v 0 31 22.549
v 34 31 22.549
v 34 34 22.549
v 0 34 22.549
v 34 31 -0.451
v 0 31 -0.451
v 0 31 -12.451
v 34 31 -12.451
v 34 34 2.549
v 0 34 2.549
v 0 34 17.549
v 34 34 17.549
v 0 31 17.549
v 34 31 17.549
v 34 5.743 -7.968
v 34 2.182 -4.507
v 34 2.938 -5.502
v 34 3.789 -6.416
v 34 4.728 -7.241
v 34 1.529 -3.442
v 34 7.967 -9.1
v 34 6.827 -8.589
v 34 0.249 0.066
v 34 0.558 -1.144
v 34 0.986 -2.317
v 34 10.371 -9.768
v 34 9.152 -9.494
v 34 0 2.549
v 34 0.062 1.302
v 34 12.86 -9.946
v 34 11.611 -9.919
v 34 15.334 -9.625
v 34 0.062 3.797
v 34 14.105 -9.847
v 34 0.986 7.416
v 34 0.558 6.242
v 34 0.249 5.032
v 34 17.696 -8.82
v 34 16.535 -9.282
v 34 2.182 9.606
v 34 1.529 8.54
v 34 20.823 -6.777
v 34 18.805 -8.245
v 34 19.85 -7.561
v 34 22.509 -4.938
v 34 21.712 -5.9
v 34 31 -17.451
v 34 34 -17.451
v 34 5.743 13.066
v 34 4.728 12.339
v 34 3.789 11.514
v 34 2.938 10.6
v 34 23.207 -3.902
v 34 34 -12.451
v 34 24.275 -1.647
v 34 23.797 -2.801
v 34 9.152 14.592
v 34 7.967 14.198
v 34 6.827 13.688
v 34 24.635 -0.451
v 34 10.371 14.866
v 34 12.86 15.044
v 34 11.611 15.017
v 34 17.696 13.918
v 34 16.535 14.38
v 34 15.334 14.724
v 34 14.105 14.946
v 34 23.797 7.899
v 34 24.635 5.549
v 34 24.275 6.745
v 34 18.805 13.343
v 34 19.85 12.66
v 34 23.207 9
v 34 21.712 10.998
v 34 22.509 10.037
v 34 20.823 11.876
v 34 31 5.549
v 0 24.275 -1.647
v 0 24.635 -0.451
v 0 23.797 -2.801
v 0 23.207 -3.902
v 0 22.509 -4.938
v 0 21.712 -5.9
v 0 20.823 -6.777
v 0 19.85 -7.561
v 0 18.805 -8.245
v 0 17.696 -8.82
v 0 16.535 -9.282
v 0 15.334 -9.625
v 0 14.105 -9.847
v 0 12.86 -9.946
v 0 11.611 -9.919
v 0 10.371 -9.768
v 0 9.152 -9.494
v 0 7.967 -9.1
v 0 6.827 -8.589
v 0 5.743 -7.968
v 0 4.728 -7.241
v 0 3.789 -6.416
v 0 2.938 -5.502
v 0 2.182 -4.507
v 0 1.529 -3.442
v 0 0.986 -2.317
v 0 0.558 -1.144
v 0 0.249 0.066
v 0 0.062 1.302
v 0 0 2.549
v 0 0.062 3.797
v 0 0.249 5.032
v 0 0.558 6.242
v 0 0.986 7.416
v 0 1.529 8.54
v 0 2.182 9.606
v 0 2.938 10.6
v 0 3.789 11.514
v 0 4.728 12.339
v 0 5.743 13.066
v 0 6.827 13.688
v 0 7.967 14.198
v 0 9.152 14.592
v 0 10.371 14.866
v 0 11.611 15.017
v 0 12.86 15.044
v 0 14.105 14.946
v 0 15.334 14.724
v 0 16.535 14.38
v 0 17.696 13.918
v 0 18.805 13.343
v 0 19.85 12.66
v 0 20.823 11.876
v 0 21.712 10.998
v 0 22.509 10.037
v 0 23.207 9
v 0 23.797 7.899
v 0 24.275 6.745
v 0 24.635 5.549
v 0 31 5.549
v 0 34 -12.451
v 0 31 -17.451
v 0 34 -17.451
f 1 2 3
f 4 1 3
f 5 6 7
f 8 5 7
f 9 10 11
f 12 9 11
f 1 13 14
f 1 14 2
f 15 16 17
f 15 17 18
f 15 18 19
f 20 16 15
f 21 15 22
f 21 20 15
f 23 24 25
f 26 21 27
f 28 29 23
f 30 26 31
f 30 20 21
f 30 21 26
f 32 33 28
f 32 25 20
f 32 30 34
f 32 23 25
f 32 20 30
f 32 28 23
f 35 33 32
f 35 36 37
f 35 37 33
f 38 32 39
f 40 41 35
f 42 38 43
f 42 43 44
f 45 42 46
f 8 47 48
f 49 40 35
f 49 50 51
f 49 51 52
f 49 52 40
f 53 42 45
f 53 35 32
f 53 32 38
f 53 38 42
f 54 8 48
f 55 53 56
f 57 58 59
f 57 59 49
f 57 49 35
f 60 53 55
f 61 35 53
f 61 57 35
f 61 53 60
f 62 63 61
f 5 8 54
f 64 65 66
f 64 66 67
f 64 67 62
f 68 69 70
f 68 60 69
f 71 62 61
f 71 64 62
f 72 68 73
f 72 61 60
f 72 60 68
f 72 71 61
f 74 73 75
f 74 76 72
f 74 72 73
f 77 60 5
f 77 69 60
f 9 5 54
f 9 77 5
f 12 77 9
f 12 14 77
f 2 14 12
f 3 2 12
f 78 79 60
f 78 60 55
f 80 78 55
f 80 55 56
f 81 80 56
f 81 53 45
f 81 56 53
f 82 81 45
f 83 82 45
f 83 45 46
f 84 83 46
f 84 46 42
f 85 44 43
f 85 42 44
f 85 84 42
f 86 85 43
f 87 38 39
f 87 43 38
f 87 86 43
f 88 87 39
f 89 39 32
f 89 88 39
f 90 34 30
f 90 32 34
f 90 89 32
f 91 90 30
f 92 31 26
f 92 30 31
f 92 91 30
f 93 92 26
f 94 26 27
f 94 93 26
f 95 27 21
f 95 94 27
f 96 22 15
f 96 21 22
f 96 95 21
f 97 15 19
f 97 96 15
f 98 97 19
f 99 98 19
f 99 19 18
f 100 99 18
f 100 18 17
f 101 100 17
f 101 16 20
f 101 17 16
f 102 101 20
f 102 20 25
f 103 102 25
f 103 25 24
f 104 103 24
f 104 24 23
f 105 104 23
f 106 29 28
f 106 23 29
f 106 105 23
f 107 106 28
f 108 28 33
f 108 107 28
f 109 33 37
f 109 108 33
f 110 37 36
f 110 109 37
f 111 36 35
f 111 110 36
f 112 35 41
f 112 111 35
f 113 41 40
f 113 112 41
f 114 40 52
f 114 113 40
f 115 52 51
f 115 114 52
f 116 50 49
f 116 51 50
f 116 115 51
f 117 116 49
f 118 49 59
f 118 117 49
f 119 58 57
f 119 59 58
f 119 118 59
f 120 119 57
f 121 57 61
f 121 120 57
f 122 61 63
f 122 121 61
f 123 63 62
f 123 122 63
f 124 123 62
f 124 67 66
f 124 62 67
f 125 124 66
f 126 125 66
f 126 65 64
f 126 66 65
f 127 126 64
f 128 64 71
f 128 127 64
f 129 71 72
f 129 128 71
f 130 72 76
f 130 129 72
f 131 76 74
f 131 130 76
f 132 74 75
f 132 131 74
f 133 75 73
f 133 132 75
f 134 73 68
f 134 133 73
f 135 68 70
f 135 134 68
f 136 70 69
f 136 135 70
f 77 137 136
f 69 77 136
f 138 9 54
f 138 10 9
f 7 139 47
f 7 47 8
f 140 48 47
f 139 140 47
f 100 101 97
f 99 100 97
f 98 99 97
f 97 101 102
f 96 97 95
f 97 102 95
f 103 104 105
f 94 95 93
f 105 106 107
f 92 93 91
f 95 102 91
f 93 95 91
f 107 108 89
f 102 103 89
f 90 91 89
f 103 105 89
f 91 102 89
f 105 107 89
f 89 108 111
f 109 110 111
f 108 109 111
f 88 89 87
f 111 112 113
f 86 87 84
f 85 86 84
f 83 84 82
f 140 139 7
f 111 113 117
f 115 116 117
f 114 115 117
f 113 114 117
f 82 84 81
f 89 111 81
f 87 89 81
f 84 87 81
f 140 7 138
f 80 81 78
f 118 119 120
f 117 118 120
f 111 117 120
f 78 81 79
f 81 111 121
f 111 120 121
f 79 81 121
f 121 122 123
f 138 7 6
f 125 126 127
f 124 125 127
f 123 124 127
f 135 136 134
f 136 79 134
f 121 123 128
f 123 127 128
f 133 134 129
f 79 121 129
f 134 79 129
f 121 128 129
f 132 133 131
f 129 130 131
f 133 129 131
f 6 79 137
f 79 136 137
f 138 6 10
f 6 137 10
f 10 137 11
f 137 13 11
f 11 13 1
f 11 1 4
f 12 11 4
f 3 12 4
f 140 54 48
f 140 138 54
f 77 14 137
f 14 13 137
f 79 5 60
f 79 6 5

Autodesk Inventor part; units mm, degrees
ref_plane "YZ Plane" through (0, 0, 0) normal (1, 0, 0) x (0, 1, 0)
ref_plane "XZ Plane" through (0, 0, 0) normal (0, 1, 0) x (-1, 0, 0)
ref_plane "XY Plane" through (0, 0, 0) normal (0, 0, 1) x (1, 0, 0)
sketch "Esboço1" plane through (0, 0, 0) normal (1, 0, 0) x (0, 1, 0)
  arc A0 (24.6347, 5.5491) -> (24.6347, -0.4509) centre (12.5, 2.5491) ccw
  line L0 (34, 2.5491) -> (34, 17.5491)
  line L1 (34, 2.5491) -> (34, -12.4509)
  line L2 (31, 5.5491) -> (24.6347, 5.5491)
  line L3 (31, -0.4509) -> (24.6347, -0.4509)
  line L4 (31, 17.5491) -> (31, 5.5491)
  line L5 (31, -0.4509) -> (31, -12.4509)
  line L6 (34, 17.5491) -> (34, 22.5491)
  line L7 (31, 17.5491) -> (31, 22.5491)
  line L8 (31, 22.5491) -> (34, 22.5491)
  line L9 (34, -12.4509) -> (34, -17.4509)
  line L10 (34, -17.4509) -> (31, -17.4509)
  line L11 (31, -17.4509) -> (31, -12.4509)
  point P0 (0, 0)
  dimension "d2" = 25
  dimension "d4" = 15
  dimension "d7" = 3
  dimension "d10" = 5
  dimension "d11" = 5
extrude "Extrusão2" add sketch "Esboço1" along normal blind 34
properties part number "boba"
